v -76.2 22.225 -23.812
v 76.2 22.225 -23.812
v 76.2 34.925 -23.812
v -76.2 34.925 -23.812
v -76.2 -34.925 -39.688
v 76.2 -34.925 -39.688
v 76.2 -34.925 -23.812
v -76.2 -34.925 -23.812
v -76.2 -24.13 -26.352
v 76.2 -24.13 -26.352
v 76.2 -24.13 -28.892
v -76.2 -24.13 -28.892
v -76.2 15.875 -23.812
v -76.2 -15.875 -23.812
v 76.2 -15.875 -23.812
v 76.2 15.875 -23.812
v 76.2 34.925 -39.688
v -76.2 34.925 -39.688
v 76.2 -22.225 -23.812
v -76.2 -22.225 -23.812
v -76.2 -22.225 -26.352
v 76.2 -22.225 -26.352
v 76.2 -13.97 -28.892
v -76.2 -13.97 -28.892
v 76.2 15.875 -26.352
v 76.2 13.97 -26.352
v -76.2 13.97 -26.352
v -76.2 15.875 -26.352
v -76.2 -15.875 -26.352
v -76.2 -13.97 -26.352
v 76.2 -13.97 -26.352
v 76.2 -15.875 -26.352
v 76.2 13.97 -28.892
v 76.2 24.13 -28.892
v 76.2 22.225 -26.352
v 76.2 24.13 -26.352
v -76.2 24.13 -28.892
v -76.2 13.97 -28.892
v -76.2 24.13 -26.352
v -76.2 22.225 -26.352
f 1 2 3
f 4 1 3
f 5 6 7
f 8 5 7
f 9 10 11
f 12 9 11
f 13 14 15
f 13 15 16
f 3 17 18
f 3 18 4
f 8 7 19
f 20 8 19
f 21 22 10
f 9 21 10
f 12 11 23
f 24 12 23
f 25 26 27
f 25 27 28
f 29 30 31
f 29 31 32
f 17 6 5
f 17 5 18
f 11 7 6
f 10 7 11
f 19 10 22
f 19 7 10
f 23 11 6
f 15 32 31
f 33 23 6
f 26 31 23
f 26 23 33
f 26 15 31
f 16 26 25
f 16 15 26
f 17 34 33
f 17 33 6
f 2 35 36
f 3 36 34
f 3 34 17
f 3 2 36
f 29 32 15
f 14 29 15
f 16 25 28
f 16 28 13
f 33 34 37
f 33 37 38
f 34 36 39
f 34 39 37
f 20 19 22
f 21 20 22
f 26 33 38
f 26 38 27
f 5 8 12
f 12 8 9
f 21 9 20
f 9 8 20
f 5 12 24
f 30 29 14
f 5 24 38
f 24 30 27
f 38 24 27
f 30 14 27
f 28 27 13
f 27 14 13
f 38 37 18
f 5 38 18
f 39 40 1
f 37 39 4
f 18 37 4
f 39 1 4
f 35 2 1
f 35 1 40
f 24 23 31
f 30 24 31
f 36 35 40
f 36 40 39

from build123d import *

# Parameters (mm, degrees)
F0_W          = 69.85
F0_H          = 15.875
F1_DEPTH      = 76.2
F1_DEPTH_BACK = 76.2
F3_DEPTH      = 76.201
F3_DEPTH_BACK = 76.201


# Not quite as in the source:
# - a pattern or mirror of a feature is missing from the dataset's text; its kind, count and spacing are read off the source's solid


with BuildPart() as f1:
    # F0 (on Right) → F1 (new body, two sides)
    with BuildSketch(Plane.YZ) as f1_sk:
        with Locations((0, -31.75)):
            Rectangle(F0_W, F0_H)
    extrude(amount=F1_DEPTH)
    extrude(f1_sk.sketch, amount=-F1_DEPTH_BACK)

    # F2 (on Right) → F3 (cut, two sides)
    with BuildSketch(Plane.YZ) as f3_sk:
        Polygon((-15.875, -26.3525), (-15.875, -23.8125), (-22.225, -23.8125), (-22.225, -26.3525), (-24.13, -26.3525), (-24.13, -28.8925), (-13.97, -28.8925), (-13.97, -26.3525), align=None)
    f3 = extrude(amount=-F3_DEPTH, mode=Mode.SUBTRACT) + extrude(f3_sk.sketch, amount=F3_DEPTH_BACK, mode=Mode.SUBTRACT)

    # F3_copies: F3 across plane
    add(f3.mirror(Plane.ZX), mode=Mode.SUBTRACT)


solid = f1.part
